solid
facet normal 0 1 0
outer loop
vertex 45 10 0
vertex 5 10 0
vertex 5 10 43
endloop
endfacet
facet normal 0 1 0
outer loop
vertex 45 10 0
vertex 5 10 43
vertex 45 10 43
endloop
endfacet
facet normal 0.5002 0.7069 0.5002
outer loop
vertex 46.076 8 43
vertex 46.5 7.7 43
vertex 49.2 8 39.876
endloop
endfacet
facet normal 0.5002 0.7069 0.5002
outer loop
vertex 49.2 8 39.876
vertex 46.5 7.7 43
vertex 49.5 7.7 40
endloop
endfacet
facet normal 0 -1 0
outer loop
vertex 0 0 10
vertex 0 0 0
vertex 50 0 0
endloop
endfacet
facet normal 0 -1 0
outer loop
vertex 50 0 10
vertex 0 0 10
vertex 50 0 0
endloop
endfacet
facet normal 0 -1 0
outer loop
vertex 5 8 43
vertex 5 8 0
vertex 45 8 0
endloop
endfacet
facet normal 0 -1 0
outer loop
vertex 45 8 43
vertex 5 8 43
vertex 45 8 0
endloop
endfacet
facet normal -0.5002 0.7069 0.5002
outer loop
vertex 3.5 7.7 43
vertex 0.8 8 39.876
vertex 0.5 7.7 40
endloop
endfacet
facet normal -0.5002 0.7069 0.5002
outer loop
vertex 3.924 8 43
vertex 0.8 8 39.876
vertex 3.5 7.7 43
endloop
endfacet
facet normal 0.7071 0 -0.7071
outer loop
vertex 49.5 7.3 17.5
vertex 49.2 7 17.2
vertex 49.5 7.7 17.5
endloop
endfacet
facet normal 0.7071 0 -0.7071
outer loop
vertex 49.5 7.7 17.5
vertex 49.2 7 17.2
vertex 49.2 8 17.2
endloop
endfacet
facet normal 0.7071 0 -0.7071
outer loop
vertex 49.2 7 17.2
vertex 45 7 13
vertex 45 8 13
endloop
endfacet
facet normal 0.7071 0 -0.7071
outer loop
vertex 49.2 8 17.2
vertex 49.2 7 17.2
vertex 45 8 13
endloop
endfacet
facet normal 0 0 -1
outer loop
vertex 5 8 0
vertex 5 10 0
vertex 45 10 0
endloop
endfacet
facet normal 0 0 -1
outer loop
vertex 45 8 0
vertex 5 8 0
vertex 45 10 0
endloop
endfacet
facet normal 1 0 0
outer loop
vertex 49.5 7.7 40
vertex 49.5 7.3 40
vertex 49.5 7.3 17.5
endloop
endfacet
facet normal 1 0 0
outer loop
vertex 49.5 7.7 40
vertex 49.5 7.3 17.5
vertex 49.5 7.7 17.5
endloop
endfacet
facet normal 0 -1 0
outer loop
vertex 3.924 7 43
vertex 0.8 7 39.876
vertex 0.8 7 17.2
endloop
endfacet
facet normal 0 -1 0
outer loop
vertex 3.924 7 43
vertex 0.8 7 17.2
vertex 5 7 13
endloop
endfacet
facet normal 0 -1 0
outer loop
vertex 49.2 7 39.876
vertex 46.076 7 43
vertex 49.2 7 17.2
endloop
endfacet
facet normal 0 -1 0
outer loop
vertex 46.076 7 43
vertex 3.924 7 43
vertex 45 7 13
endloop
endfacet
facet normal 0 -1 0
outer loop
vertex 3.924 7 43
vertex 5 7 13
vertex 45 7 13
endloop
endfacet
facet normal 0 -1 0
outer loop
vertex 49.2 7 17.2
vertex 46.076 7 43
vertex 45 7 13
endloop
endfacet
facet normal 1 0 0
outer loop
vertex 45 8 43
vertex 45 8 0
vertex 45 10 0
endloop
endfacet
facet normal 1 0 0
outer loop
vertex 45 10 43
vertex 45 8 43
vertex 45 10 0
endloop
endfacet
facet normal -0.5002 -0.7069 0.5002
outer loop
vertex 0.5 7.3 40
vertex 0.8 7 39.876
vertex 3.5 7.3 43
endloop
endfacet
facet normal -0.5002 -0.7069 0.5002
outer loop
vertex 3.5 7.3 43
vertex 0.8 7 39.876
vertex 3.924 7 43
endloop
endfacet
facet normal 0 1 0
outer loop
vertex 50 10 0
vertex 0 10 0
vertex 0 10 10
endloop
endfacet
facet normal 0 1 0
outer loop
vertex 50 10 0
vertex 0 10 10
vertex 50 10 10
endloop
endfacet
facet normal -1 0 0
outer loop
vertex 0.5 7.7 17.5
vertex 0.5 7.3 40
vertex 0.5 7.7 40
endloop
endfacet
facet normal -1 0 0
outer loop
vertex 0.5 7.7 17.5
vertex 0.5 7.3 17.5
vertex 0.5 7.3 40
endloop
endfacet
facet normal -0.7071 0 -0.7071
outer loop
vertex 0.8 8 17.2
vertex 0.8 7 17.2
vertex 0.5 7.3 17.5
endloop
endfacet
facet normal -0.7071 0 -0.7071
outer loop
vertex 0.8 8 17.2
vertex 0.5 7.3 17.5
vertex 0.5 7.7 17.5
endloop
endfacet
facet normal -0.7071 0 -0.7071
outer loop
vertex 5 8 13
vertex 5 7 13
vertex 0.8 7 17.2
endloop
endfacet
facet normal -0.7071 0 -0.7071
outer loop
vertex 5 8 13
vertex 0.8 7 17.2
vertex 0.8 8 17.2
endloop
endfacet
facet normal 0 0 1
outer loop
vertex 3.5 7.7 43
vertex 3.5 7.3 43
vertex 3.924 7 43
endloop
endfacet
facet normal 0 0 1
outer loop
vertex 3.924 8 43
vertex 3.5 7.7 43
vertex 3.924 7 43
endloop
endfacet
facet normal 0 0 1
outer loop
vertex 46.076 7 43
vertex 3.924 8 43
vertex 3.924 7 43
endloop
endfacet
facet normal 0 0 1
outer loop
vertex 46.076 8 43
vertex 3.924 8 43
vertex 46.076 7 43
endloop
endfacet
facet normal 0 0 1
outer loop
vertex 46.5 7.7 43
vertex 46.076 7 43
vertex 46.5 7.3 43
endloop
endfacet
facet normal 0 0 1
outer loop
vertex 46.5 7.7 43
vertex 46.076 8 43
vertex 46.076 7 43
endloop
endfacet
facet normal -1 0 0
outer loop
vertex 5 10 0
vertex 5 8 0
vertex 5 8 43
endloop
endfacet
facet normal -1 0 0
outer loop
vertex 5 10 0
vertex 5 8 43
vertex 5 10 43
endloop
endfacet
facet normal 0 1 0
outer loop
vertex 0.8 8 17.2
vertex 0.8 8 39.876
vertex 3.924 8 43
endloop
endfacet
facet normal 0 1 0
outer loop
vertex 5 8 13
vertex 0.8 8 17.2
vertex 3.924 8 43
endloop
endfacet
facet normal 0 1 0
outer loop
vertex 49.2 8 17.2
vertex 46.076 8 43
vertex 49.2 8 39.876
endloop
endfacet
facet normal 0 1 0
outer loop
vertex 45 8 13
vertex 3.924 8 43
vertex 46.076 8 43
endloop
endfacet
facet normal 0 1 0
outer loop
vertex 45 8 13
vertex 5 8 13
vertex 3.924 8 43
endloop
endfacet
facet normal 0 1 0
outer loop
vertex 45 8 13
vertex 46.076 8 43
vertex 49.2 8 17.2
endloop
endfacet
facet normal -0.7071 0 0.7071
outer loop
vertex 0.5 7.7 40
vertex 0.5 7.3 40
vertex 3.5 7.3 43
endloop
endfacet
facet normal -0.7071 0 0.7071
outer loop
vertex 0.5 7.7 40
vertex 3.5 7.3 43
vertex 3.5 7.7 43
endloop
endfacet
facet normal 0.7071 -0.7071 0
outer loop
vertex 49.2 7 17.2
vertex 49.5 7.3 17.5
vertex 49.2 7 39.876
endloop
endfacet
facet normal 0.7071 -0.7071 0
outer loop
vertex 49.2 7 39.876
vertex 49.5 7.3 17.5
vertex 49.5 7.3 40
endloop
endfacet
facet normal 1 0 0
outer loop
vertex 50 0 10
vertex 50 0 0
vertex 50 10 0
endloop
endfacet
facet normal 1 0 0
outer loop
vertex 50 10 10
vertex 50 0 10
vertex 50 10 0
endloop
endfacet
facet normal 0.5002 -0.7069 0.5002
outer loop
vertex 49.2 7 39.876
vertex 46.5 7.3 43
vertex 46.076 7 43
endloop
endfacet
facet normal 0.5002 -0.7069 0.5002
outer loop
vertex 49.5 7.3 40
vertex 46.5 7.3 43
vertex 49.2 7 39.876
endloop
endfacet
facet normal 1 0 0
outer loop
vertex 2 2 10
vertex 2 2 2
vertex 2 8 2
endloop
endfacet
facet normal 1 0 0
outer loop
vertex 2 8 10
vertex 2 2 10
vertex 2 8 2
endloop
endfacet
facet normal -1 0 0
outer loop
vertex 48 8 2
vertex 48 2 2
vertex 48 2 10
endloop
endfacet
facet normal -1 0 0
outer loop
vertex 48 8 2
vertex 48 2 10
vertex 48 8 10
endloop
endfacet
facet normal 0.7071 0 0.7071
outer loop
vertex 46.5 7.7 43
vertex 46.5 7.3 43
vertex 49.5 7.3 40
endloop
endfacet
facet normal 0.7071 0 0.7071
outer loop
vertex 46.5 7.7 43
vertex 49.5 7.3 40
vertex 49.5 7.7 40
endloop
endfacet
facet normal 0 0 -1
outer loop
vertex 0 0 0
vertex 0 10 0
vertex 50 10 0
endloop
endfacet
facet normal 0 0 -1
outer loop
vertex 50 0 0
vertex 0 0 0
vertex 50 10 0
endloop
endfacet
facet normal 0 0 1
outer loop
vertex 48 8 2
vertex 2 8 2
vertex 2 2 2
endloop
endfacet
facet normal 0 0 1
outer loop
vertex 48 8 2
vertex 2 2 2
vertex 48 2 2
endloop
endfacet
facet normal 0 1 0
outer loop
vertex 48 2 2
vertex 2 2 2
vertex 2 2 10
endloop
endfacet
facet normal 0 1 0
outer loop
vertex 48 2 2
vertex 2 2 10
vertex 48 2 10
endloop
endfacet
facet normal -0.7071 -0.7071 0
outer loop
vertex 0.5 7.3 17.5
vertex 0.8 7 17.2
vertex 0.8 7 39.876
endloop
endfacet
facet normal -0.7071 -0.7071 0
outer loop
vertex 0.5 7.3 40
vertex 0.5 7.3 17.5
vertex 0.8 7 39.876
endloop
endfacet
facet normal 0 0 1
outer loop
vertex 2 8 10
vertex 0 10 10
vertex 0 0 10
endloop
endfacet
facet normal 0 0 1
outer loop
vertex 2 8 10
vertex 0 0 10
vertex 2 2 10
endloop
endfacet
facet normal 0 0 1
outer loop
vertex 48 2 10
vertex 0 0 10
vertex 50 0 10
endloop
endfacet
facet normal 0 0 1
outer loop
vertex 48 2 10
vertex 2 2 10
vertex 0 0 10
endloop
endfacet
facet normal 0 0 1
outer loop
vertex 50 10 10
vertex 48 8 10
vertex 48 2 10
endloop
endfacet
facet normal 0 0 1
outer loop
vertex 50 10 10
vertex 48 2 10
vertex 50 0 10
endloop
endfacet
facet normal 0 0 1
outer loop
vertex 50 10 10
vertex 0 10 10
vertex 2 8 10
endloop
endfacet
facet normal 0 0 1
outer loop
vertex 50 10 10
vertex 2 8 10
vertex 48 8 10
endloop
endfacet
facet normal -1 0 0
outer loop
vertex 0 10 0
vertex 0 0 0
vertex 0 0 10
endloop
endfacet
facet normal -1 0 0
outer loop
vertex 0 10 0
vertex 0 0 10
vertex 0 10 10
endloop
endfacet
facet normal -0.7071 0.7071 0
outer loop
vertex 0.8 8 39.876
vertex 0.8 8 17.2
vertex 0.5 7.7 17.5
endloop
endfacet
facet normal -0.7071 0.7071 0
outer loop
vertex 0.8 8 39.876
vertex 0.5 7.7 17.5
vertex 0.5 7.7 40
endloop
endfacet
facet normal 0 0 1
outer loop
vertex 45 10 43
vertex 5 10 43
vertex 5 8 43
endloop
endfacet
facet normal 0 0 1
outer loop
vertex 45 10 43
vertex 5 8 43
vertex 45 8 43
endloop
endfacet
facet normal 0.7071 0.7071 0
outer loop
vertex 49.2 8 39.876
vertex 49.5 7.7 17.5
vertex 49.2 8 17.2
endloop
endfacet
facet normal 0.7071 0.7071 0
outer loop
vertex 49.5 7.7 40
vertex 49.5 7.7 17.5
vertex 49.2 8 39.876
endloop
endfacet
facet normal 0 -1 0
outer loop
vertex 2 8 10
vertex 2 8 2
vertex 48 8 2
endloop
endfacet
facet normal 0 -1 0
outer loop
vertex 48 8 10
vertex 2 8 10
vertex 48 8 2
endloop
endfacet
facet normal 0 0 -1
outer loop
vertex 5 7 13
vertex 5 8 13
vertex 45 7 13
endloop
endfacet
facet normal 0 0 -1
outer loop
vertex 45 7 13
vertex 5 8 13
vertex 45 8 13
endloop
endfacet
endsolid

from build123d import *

# Parameters (mm, degrees)
BOX044_W        = 40
BOX044_H        = 2
BOX044_DEPTH    = 43
BOX045_W        = 46
BOX045_H        = 6
BOX045_DEPTH    = 8
BOX_W           = 50
BOX_H           = 10
BOX_DEPTH       = 10
BOX046_W        = 49
BOX046_H        = 1
BOX046_DEPTH    = 30
CHAMFER_SIZE    = 4.5
CHAMFER001_SIZE = 3
CHAMFER002_SIZE = 0.3
CHAMFER003_SIZE = 0.3


with BuildPart() as cube039:
    # Box044 → Box044 (new body)
    with BuildSketch(Plane(origin=(5, 8, 0), x_dir=(1, 0, 0), z_dir=(0, 0, 1))):
        with Locations((20, 1)):
            Rectangle(BOX044_W, BOX044_H)
    extrude(amount=BOX044_DEPTH)


with BuildPart() as cube040:
    # Box045 → Box045 (new body)
    with BuildSketch(Plane(origin=(2, 2, 2), x_dir=(1, 0, 0), z_dir=(0, 0, 1))):
        with Locations((23, 3)):
            Rectangle(BOX045_W, BOX045_H)
    extrude(amount=BOX045_DEPTH)


with BuildPart() as cut:
    # Box → Box (new body)
    with BuildSketch(Plane.XY):
        with Locations((25, 5)):
            Rectangle(BOX_W, BOX_H)
    extrude(amount=BOX_DEPTH)

    # Cut: cut Cube040
    add(cube040.part, mode=Mode.SUBTRACT)


with BuildPart() as chamfer003:
    # Box046 → Box046 (new body)
    with BuildSketch(Plane(origin=(0.5, 6, 12), x_dir=(1, 0, 0), z_dir=(0, 0, 1))):
        with Locations((24.5, 0.5)):
            Rectangle(BOX046_W, BOX046_H)
    extrude(amount=BOX046_DEPTH)

    # Chamfer
    chamfer_edges = [chamfer003.edges().sort_by_distance(p)[0] for p in [
        (0.5, 6.5, 12),
        (49.5, 6.5, 12),
    ]]
    chamfer(chamfer_edges, length=CHAMFER_SIZE)


with BuildPart() as chamfer003_1:
    # Chamfer placement: moved
    add(chamfer003.part.moved(Location((0, 1, 1))))

    # Chamfer001
    chamfer001_edges = [chamfer003_1.edges().sort_by_distance(p)[0] for p in [
        (0.5, 7.5, 43),
        (49.5, 7.5, 43),
    ]]
    chamfer(chamfer001_edges, length=CHAMFER001_SIZE)

    # Chamfer002
    chamfer002_edges = [chamfer003_1.edges().sort_by_distance(p)[0] for p in [
        (0.5, 7, 28.75),
        (0.5, 8, 28.75),
        (49.5, 7, 28.75),
        (49.5, 8, 28.75),
    ]]
    chamfer(chamfer002_edges, length=CHAMFER002_SIZE)

    # Chamfer003
    chamfer003_edges = [chamfer003_1.edges().sort_by_distance(p)[0] for p in [
        (2.15, 7, 41.65),
        (2.15, 8, 41.65),
        (47.85, 7, 41.65),
        (47.85, 8, 41.65),
    ]]
    chamfer(chamfer003_edges, length=CHAMFER003_SIZE)


solid = Compound([cube039.part, cut.part, chamfer003_1.part])
